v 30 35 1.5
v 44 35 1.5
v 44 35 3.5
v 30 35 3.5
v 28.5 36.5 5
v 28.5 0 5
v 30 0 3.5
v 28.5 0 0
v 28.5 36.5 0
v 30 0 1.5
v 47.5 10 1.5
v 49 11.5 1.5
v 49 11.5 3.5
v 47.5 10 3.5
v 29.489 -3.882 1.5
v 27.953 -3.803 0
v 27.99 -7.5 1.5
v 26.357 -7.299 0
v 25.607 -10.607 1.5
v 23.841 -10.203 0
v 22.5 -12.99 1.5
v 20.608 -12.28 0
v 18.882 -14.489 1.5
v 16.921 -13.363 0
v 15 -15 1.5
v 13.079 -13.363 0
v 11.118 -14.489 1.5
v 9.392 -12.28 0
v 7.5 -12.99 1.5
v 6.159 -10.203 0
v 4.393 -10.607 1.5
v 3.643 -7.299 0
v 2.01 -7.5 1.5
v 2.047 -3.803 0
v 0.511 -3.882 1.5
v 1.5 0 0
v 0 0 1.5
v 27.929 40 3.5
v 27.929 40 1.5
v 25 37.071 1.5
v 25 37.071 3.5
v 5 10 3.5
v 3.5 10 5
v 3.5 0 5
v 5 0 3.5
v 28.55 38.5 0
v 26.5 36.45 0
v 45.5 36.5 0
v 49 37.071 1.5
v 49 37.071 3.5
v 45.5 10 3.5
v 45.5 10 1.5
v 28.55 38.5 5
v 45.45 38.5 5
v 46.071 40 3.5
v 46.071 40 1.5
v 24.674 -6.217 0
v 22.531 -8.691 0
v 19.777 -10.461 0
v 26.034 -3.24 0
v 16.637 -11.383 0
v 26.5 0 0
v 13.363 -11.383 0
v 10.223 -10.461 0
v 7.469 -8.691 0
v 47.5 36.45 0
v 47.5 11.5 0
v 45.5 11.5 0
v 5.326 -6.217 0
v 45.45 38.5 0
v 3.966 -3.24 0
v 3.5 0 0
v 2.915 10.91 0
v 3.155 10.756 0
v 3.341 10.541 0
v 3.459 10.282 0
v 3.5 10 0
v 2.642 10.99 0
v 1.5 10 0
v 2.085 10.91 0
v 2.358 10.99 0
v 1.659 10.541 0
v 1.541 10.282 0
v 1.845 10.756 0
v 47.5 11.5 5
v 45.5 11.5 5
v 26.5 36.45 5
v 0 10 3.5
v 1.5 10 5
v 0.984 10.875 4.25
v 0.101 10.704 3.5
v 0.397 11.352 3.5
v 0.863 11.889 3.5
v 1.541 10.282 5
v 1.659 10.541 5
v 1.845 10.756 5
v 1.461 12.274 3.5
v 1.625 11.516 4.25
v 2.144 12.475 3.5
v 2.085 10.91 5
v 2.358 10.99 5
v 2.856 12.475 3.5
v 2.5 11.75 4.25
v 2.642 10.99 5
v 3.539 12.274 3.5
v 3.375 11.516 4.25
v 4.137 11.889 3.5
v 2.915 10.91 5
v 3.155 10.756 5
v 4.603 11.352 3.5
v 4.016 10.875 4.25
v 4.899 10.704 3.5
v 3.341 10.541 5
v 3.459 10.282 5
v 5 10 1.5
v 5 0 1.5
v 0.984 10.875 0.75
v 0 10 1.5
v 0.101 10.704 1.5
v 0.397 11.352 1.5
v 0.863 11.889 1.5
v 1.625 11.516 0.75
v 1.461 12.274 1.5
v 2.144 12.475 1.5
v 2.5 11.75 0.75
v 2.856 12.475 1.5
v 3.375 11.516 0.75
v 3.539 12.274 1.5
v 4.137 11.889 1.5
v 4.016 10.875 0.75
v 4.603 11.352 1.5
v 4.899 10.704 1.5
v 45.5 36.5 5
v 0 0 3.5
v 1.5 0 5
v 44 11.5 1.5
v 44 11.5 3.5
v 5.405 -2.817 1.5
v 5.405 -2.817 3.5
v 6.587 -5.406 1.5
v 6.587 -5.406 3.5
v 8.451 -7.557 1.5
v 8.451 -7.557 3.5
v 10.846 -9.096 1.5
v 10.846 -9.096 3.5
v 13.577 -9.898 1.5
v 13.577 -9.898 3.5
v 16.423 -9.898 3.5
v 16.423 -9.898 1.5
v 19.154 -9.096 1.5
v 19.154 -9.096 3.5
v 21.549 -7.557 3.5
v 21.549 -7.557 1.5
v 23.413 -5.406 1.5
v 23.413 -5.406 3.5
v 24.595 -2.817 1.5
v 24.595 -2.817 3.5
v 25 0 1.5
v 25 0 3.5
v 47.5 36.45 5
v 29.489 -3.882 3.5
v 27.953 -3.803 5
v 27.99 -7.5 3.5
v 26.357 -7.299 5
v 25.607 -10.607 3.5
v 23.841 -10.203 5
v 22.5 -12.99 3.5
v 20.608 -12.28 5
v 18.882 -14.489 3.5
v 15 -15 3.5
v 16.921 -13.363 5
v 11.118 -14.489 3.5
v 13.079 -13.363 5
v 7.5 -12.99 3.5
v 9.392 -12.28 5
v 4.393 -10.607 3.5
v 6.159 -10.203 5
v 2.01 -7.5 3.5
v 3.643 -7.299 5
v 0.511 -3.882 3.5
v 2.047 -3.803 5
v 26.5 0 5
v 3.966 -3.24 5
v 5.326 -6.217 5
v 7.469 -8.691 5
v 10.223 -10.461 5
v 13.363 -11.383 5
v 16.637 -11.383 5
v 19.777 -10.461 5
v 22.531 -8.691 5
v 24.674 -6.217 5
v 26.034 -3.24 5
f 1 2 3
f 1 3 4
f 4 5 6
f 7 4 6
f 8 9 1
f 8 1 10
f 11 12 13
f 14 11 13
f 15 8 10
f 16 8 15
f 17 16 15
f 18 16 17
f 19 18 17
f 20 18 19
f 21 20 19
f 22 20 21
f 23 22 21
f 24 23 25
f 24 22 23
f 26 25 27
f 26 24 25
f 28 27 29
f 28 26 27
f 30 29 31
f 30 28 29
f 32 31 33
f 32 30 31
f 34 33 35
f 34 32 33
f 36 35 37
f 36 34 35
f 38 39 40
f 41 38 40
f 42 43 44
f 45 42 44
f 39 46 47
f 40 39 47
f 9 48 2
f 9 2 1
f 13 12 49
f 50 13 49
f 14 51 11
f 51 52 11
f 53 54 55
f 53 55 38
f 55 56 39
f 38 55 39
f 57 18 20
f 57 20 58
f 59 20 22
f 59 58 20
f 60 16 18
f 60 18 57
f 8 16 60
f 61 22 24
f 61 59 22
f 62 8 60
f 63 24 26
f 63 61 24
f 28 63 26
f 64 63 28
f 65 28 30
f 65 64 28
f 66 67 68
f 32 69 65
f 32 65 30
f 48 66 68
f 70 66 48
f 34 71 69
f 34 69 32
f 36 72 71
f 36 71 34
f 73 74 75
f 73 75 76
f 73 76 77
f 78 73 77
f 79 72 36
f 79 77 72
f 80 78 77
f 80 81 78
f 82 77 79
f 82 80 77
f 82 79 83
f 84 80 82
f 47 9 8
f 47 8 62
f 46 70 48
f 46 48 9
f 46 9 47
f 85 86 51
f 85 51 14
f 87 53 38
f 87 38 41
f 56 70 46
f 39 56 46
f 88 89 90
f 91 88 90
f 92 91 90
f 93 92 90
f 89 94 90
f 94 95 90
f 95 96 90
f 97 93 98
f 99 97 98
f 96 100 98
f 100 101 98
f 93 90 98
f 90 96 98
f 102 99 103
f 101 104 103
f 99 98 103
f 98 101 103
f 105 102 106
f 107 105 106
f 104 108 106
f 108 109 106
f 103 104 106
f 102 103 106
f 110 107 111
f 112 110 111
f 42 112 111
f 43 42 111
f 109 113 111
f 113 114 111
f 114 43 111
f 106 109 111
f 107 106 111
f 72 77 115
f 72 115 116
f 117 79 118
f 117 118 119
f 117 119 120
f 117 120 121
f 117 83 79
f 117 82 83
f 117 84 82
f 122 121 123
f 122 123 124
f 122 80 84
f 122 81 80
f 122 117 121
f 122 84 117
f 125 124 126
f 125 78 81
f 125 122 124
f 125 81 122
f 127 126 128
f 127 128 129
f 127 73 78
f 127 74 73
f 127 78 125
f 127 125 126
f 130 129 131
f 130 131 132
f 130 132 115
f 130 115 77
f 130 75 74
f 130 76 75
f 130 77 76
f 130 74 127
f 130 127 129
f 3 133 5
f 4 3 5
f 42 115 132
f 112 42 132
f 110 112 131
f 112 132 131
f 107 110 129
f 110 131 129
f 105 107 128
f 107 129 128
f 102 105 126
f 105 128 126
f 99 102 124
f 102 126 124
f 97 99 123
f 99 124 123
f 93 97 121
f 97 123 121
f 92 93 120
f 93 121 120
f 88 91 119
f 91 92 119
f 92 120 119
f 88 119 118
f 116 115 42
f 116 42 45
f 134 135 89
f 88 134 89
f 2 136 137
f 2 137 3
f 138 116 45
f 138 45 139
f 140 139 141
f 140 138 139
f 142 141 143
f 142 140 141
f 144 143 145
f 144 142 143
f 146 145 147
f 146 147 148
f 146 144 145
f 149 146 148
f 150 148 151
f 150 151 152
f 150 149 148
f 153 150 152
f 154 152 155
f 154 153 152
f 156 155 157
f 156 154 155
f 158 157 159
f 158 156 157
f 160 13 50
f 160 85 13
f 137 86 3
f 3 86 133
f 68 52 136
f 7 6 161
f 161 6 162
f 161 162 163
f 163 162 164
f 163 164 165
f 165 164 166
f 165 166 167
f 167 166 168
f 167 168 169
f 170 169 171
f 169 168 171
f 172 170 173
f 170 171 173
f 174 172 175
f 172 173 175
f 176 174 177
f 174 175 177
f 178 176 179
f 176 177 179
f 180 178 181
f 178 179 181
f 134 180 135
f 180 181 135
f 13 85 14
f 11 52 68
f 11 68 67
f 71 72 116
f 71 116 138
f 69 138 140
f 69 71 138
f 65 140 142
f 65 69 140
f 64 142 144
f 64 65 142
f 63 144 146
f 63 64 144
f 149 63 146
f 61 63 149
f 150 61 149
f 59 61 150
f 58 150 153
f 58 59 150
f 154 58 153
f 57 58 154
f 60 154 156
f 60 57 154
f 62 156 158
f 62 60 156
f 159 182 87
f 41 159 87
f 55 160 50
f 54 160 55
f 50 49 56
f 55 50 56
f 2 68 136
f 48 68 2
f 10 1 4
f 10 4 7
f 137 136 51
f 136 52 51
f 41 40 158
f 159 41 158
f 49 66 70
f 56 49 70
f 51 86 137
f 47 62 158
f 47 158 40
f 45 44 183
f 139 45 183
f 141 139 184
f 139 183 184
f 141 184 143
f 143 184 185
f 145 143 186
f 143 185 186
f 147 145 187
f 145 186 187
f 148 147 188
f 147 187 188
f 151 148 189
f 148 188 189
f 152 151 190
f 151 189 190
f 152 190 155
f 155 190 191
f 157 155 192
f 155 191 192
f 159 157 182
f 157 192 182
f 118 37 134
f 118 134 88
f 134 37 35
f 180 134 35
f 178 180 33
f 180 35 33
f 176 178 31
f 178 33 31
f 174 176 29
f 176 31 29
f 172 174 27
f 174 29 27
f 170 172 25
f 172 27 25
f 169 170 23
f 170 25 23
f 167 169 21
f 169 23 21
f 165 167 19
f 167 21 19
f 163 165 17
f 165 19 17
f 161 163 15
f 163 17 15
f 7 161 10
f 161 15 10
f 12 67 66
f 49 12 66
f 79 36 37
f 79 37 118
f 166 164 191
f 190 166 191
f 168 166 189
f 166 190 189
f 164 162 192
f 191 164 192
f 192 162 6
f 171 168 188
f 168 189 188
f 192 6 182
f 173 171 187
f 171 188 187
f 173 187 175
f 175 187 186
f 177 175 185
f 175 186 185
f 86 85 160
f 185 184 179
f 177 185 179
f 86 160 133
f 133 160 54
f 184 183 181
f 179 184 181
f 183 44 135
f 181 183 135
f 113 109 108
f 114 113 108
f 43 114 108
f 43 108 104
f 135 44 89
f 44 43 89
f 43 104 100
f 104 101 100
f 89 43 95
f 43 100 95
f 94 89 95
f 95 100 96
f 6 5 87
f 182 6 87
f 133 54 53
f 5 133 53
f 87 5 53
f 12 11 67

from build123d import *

# Parameters (mm, degrees)
PAD_DEPTH    = 5
CHAMFER_SIZE = 1.5


with BuildPart() as part:
    # Sketch → Pad (new body)
    with BuildSketch(Plane.XY):
        with BuildLine():
            Line((44, 10), (44, 35))
            Line((44, 35), (30, 35))
            Line((30, 35), (30, 10))
            Line((30, 10), (30, 0))
            ThreePointArc((0, 0), (15, -15), (30, 0))
            Line((0, 0), (0, 10))
            ThreePointArc((5, 10), (2.5, 12.5), (0, 10))
            Line((5, 10), (5, 0))
            ThreePointArc((5, 0), (15, -10), (25, 0))
            Line((25, 37.071068), (25, 0))
            Line((27.928932, 40), (25, 37.071068))
            Line((46.071068, 40), (27.928932, 40))
            Line((49, 37.071068), (46.071068, 40))
            Line((49, 10), (49, 37.071068))
            Line((44, 10), (49, 10))
        make_face()
    extrude(amount=PAD_DEPTH)

    # Chamfer
    chamfer_edges = [part.edges().sort_by_distance(p)[0] for p in [
        (44, 22.5, 5),
        (37, 35, 5),
        (30, 17.5, 5),
        (15, -15, 5),
        (0, 5, 5),
        (2.5, 12.5, 5),
        (5, 5, 5),
        (15, -10, 5),
        (25, 18.535534, 5),
        (26.464466, 38.535534, 5),
        (37, 40, 5),
        (47.535534, 38.535534, 5),
        (49, 23.535534, 5),
        (46.5, 10, 5),
        (44, 10, 2.5),
        (49, 10, 2.5),
        (46.5, 10, 0),
        (44, 22.5, 0),
        (37, 35, 0),
        (30, 17.5, 0),
        (15, -15, 0),
        (0, 5, 0),
        (2.5, 12.5, 0),
        (5, 5, 0),
        (15, -10, 0),
        (25, 18.535534, 0),
        (26.464466, 38.535534, 0),
        (37, 40, 0),
        (47.535534, 38.535534, 0),
        (49, 23.535534, 0),
    ]]
    chamfer(chamfer_edges, length=CHAMFER_SIZE)


solid = part.part
